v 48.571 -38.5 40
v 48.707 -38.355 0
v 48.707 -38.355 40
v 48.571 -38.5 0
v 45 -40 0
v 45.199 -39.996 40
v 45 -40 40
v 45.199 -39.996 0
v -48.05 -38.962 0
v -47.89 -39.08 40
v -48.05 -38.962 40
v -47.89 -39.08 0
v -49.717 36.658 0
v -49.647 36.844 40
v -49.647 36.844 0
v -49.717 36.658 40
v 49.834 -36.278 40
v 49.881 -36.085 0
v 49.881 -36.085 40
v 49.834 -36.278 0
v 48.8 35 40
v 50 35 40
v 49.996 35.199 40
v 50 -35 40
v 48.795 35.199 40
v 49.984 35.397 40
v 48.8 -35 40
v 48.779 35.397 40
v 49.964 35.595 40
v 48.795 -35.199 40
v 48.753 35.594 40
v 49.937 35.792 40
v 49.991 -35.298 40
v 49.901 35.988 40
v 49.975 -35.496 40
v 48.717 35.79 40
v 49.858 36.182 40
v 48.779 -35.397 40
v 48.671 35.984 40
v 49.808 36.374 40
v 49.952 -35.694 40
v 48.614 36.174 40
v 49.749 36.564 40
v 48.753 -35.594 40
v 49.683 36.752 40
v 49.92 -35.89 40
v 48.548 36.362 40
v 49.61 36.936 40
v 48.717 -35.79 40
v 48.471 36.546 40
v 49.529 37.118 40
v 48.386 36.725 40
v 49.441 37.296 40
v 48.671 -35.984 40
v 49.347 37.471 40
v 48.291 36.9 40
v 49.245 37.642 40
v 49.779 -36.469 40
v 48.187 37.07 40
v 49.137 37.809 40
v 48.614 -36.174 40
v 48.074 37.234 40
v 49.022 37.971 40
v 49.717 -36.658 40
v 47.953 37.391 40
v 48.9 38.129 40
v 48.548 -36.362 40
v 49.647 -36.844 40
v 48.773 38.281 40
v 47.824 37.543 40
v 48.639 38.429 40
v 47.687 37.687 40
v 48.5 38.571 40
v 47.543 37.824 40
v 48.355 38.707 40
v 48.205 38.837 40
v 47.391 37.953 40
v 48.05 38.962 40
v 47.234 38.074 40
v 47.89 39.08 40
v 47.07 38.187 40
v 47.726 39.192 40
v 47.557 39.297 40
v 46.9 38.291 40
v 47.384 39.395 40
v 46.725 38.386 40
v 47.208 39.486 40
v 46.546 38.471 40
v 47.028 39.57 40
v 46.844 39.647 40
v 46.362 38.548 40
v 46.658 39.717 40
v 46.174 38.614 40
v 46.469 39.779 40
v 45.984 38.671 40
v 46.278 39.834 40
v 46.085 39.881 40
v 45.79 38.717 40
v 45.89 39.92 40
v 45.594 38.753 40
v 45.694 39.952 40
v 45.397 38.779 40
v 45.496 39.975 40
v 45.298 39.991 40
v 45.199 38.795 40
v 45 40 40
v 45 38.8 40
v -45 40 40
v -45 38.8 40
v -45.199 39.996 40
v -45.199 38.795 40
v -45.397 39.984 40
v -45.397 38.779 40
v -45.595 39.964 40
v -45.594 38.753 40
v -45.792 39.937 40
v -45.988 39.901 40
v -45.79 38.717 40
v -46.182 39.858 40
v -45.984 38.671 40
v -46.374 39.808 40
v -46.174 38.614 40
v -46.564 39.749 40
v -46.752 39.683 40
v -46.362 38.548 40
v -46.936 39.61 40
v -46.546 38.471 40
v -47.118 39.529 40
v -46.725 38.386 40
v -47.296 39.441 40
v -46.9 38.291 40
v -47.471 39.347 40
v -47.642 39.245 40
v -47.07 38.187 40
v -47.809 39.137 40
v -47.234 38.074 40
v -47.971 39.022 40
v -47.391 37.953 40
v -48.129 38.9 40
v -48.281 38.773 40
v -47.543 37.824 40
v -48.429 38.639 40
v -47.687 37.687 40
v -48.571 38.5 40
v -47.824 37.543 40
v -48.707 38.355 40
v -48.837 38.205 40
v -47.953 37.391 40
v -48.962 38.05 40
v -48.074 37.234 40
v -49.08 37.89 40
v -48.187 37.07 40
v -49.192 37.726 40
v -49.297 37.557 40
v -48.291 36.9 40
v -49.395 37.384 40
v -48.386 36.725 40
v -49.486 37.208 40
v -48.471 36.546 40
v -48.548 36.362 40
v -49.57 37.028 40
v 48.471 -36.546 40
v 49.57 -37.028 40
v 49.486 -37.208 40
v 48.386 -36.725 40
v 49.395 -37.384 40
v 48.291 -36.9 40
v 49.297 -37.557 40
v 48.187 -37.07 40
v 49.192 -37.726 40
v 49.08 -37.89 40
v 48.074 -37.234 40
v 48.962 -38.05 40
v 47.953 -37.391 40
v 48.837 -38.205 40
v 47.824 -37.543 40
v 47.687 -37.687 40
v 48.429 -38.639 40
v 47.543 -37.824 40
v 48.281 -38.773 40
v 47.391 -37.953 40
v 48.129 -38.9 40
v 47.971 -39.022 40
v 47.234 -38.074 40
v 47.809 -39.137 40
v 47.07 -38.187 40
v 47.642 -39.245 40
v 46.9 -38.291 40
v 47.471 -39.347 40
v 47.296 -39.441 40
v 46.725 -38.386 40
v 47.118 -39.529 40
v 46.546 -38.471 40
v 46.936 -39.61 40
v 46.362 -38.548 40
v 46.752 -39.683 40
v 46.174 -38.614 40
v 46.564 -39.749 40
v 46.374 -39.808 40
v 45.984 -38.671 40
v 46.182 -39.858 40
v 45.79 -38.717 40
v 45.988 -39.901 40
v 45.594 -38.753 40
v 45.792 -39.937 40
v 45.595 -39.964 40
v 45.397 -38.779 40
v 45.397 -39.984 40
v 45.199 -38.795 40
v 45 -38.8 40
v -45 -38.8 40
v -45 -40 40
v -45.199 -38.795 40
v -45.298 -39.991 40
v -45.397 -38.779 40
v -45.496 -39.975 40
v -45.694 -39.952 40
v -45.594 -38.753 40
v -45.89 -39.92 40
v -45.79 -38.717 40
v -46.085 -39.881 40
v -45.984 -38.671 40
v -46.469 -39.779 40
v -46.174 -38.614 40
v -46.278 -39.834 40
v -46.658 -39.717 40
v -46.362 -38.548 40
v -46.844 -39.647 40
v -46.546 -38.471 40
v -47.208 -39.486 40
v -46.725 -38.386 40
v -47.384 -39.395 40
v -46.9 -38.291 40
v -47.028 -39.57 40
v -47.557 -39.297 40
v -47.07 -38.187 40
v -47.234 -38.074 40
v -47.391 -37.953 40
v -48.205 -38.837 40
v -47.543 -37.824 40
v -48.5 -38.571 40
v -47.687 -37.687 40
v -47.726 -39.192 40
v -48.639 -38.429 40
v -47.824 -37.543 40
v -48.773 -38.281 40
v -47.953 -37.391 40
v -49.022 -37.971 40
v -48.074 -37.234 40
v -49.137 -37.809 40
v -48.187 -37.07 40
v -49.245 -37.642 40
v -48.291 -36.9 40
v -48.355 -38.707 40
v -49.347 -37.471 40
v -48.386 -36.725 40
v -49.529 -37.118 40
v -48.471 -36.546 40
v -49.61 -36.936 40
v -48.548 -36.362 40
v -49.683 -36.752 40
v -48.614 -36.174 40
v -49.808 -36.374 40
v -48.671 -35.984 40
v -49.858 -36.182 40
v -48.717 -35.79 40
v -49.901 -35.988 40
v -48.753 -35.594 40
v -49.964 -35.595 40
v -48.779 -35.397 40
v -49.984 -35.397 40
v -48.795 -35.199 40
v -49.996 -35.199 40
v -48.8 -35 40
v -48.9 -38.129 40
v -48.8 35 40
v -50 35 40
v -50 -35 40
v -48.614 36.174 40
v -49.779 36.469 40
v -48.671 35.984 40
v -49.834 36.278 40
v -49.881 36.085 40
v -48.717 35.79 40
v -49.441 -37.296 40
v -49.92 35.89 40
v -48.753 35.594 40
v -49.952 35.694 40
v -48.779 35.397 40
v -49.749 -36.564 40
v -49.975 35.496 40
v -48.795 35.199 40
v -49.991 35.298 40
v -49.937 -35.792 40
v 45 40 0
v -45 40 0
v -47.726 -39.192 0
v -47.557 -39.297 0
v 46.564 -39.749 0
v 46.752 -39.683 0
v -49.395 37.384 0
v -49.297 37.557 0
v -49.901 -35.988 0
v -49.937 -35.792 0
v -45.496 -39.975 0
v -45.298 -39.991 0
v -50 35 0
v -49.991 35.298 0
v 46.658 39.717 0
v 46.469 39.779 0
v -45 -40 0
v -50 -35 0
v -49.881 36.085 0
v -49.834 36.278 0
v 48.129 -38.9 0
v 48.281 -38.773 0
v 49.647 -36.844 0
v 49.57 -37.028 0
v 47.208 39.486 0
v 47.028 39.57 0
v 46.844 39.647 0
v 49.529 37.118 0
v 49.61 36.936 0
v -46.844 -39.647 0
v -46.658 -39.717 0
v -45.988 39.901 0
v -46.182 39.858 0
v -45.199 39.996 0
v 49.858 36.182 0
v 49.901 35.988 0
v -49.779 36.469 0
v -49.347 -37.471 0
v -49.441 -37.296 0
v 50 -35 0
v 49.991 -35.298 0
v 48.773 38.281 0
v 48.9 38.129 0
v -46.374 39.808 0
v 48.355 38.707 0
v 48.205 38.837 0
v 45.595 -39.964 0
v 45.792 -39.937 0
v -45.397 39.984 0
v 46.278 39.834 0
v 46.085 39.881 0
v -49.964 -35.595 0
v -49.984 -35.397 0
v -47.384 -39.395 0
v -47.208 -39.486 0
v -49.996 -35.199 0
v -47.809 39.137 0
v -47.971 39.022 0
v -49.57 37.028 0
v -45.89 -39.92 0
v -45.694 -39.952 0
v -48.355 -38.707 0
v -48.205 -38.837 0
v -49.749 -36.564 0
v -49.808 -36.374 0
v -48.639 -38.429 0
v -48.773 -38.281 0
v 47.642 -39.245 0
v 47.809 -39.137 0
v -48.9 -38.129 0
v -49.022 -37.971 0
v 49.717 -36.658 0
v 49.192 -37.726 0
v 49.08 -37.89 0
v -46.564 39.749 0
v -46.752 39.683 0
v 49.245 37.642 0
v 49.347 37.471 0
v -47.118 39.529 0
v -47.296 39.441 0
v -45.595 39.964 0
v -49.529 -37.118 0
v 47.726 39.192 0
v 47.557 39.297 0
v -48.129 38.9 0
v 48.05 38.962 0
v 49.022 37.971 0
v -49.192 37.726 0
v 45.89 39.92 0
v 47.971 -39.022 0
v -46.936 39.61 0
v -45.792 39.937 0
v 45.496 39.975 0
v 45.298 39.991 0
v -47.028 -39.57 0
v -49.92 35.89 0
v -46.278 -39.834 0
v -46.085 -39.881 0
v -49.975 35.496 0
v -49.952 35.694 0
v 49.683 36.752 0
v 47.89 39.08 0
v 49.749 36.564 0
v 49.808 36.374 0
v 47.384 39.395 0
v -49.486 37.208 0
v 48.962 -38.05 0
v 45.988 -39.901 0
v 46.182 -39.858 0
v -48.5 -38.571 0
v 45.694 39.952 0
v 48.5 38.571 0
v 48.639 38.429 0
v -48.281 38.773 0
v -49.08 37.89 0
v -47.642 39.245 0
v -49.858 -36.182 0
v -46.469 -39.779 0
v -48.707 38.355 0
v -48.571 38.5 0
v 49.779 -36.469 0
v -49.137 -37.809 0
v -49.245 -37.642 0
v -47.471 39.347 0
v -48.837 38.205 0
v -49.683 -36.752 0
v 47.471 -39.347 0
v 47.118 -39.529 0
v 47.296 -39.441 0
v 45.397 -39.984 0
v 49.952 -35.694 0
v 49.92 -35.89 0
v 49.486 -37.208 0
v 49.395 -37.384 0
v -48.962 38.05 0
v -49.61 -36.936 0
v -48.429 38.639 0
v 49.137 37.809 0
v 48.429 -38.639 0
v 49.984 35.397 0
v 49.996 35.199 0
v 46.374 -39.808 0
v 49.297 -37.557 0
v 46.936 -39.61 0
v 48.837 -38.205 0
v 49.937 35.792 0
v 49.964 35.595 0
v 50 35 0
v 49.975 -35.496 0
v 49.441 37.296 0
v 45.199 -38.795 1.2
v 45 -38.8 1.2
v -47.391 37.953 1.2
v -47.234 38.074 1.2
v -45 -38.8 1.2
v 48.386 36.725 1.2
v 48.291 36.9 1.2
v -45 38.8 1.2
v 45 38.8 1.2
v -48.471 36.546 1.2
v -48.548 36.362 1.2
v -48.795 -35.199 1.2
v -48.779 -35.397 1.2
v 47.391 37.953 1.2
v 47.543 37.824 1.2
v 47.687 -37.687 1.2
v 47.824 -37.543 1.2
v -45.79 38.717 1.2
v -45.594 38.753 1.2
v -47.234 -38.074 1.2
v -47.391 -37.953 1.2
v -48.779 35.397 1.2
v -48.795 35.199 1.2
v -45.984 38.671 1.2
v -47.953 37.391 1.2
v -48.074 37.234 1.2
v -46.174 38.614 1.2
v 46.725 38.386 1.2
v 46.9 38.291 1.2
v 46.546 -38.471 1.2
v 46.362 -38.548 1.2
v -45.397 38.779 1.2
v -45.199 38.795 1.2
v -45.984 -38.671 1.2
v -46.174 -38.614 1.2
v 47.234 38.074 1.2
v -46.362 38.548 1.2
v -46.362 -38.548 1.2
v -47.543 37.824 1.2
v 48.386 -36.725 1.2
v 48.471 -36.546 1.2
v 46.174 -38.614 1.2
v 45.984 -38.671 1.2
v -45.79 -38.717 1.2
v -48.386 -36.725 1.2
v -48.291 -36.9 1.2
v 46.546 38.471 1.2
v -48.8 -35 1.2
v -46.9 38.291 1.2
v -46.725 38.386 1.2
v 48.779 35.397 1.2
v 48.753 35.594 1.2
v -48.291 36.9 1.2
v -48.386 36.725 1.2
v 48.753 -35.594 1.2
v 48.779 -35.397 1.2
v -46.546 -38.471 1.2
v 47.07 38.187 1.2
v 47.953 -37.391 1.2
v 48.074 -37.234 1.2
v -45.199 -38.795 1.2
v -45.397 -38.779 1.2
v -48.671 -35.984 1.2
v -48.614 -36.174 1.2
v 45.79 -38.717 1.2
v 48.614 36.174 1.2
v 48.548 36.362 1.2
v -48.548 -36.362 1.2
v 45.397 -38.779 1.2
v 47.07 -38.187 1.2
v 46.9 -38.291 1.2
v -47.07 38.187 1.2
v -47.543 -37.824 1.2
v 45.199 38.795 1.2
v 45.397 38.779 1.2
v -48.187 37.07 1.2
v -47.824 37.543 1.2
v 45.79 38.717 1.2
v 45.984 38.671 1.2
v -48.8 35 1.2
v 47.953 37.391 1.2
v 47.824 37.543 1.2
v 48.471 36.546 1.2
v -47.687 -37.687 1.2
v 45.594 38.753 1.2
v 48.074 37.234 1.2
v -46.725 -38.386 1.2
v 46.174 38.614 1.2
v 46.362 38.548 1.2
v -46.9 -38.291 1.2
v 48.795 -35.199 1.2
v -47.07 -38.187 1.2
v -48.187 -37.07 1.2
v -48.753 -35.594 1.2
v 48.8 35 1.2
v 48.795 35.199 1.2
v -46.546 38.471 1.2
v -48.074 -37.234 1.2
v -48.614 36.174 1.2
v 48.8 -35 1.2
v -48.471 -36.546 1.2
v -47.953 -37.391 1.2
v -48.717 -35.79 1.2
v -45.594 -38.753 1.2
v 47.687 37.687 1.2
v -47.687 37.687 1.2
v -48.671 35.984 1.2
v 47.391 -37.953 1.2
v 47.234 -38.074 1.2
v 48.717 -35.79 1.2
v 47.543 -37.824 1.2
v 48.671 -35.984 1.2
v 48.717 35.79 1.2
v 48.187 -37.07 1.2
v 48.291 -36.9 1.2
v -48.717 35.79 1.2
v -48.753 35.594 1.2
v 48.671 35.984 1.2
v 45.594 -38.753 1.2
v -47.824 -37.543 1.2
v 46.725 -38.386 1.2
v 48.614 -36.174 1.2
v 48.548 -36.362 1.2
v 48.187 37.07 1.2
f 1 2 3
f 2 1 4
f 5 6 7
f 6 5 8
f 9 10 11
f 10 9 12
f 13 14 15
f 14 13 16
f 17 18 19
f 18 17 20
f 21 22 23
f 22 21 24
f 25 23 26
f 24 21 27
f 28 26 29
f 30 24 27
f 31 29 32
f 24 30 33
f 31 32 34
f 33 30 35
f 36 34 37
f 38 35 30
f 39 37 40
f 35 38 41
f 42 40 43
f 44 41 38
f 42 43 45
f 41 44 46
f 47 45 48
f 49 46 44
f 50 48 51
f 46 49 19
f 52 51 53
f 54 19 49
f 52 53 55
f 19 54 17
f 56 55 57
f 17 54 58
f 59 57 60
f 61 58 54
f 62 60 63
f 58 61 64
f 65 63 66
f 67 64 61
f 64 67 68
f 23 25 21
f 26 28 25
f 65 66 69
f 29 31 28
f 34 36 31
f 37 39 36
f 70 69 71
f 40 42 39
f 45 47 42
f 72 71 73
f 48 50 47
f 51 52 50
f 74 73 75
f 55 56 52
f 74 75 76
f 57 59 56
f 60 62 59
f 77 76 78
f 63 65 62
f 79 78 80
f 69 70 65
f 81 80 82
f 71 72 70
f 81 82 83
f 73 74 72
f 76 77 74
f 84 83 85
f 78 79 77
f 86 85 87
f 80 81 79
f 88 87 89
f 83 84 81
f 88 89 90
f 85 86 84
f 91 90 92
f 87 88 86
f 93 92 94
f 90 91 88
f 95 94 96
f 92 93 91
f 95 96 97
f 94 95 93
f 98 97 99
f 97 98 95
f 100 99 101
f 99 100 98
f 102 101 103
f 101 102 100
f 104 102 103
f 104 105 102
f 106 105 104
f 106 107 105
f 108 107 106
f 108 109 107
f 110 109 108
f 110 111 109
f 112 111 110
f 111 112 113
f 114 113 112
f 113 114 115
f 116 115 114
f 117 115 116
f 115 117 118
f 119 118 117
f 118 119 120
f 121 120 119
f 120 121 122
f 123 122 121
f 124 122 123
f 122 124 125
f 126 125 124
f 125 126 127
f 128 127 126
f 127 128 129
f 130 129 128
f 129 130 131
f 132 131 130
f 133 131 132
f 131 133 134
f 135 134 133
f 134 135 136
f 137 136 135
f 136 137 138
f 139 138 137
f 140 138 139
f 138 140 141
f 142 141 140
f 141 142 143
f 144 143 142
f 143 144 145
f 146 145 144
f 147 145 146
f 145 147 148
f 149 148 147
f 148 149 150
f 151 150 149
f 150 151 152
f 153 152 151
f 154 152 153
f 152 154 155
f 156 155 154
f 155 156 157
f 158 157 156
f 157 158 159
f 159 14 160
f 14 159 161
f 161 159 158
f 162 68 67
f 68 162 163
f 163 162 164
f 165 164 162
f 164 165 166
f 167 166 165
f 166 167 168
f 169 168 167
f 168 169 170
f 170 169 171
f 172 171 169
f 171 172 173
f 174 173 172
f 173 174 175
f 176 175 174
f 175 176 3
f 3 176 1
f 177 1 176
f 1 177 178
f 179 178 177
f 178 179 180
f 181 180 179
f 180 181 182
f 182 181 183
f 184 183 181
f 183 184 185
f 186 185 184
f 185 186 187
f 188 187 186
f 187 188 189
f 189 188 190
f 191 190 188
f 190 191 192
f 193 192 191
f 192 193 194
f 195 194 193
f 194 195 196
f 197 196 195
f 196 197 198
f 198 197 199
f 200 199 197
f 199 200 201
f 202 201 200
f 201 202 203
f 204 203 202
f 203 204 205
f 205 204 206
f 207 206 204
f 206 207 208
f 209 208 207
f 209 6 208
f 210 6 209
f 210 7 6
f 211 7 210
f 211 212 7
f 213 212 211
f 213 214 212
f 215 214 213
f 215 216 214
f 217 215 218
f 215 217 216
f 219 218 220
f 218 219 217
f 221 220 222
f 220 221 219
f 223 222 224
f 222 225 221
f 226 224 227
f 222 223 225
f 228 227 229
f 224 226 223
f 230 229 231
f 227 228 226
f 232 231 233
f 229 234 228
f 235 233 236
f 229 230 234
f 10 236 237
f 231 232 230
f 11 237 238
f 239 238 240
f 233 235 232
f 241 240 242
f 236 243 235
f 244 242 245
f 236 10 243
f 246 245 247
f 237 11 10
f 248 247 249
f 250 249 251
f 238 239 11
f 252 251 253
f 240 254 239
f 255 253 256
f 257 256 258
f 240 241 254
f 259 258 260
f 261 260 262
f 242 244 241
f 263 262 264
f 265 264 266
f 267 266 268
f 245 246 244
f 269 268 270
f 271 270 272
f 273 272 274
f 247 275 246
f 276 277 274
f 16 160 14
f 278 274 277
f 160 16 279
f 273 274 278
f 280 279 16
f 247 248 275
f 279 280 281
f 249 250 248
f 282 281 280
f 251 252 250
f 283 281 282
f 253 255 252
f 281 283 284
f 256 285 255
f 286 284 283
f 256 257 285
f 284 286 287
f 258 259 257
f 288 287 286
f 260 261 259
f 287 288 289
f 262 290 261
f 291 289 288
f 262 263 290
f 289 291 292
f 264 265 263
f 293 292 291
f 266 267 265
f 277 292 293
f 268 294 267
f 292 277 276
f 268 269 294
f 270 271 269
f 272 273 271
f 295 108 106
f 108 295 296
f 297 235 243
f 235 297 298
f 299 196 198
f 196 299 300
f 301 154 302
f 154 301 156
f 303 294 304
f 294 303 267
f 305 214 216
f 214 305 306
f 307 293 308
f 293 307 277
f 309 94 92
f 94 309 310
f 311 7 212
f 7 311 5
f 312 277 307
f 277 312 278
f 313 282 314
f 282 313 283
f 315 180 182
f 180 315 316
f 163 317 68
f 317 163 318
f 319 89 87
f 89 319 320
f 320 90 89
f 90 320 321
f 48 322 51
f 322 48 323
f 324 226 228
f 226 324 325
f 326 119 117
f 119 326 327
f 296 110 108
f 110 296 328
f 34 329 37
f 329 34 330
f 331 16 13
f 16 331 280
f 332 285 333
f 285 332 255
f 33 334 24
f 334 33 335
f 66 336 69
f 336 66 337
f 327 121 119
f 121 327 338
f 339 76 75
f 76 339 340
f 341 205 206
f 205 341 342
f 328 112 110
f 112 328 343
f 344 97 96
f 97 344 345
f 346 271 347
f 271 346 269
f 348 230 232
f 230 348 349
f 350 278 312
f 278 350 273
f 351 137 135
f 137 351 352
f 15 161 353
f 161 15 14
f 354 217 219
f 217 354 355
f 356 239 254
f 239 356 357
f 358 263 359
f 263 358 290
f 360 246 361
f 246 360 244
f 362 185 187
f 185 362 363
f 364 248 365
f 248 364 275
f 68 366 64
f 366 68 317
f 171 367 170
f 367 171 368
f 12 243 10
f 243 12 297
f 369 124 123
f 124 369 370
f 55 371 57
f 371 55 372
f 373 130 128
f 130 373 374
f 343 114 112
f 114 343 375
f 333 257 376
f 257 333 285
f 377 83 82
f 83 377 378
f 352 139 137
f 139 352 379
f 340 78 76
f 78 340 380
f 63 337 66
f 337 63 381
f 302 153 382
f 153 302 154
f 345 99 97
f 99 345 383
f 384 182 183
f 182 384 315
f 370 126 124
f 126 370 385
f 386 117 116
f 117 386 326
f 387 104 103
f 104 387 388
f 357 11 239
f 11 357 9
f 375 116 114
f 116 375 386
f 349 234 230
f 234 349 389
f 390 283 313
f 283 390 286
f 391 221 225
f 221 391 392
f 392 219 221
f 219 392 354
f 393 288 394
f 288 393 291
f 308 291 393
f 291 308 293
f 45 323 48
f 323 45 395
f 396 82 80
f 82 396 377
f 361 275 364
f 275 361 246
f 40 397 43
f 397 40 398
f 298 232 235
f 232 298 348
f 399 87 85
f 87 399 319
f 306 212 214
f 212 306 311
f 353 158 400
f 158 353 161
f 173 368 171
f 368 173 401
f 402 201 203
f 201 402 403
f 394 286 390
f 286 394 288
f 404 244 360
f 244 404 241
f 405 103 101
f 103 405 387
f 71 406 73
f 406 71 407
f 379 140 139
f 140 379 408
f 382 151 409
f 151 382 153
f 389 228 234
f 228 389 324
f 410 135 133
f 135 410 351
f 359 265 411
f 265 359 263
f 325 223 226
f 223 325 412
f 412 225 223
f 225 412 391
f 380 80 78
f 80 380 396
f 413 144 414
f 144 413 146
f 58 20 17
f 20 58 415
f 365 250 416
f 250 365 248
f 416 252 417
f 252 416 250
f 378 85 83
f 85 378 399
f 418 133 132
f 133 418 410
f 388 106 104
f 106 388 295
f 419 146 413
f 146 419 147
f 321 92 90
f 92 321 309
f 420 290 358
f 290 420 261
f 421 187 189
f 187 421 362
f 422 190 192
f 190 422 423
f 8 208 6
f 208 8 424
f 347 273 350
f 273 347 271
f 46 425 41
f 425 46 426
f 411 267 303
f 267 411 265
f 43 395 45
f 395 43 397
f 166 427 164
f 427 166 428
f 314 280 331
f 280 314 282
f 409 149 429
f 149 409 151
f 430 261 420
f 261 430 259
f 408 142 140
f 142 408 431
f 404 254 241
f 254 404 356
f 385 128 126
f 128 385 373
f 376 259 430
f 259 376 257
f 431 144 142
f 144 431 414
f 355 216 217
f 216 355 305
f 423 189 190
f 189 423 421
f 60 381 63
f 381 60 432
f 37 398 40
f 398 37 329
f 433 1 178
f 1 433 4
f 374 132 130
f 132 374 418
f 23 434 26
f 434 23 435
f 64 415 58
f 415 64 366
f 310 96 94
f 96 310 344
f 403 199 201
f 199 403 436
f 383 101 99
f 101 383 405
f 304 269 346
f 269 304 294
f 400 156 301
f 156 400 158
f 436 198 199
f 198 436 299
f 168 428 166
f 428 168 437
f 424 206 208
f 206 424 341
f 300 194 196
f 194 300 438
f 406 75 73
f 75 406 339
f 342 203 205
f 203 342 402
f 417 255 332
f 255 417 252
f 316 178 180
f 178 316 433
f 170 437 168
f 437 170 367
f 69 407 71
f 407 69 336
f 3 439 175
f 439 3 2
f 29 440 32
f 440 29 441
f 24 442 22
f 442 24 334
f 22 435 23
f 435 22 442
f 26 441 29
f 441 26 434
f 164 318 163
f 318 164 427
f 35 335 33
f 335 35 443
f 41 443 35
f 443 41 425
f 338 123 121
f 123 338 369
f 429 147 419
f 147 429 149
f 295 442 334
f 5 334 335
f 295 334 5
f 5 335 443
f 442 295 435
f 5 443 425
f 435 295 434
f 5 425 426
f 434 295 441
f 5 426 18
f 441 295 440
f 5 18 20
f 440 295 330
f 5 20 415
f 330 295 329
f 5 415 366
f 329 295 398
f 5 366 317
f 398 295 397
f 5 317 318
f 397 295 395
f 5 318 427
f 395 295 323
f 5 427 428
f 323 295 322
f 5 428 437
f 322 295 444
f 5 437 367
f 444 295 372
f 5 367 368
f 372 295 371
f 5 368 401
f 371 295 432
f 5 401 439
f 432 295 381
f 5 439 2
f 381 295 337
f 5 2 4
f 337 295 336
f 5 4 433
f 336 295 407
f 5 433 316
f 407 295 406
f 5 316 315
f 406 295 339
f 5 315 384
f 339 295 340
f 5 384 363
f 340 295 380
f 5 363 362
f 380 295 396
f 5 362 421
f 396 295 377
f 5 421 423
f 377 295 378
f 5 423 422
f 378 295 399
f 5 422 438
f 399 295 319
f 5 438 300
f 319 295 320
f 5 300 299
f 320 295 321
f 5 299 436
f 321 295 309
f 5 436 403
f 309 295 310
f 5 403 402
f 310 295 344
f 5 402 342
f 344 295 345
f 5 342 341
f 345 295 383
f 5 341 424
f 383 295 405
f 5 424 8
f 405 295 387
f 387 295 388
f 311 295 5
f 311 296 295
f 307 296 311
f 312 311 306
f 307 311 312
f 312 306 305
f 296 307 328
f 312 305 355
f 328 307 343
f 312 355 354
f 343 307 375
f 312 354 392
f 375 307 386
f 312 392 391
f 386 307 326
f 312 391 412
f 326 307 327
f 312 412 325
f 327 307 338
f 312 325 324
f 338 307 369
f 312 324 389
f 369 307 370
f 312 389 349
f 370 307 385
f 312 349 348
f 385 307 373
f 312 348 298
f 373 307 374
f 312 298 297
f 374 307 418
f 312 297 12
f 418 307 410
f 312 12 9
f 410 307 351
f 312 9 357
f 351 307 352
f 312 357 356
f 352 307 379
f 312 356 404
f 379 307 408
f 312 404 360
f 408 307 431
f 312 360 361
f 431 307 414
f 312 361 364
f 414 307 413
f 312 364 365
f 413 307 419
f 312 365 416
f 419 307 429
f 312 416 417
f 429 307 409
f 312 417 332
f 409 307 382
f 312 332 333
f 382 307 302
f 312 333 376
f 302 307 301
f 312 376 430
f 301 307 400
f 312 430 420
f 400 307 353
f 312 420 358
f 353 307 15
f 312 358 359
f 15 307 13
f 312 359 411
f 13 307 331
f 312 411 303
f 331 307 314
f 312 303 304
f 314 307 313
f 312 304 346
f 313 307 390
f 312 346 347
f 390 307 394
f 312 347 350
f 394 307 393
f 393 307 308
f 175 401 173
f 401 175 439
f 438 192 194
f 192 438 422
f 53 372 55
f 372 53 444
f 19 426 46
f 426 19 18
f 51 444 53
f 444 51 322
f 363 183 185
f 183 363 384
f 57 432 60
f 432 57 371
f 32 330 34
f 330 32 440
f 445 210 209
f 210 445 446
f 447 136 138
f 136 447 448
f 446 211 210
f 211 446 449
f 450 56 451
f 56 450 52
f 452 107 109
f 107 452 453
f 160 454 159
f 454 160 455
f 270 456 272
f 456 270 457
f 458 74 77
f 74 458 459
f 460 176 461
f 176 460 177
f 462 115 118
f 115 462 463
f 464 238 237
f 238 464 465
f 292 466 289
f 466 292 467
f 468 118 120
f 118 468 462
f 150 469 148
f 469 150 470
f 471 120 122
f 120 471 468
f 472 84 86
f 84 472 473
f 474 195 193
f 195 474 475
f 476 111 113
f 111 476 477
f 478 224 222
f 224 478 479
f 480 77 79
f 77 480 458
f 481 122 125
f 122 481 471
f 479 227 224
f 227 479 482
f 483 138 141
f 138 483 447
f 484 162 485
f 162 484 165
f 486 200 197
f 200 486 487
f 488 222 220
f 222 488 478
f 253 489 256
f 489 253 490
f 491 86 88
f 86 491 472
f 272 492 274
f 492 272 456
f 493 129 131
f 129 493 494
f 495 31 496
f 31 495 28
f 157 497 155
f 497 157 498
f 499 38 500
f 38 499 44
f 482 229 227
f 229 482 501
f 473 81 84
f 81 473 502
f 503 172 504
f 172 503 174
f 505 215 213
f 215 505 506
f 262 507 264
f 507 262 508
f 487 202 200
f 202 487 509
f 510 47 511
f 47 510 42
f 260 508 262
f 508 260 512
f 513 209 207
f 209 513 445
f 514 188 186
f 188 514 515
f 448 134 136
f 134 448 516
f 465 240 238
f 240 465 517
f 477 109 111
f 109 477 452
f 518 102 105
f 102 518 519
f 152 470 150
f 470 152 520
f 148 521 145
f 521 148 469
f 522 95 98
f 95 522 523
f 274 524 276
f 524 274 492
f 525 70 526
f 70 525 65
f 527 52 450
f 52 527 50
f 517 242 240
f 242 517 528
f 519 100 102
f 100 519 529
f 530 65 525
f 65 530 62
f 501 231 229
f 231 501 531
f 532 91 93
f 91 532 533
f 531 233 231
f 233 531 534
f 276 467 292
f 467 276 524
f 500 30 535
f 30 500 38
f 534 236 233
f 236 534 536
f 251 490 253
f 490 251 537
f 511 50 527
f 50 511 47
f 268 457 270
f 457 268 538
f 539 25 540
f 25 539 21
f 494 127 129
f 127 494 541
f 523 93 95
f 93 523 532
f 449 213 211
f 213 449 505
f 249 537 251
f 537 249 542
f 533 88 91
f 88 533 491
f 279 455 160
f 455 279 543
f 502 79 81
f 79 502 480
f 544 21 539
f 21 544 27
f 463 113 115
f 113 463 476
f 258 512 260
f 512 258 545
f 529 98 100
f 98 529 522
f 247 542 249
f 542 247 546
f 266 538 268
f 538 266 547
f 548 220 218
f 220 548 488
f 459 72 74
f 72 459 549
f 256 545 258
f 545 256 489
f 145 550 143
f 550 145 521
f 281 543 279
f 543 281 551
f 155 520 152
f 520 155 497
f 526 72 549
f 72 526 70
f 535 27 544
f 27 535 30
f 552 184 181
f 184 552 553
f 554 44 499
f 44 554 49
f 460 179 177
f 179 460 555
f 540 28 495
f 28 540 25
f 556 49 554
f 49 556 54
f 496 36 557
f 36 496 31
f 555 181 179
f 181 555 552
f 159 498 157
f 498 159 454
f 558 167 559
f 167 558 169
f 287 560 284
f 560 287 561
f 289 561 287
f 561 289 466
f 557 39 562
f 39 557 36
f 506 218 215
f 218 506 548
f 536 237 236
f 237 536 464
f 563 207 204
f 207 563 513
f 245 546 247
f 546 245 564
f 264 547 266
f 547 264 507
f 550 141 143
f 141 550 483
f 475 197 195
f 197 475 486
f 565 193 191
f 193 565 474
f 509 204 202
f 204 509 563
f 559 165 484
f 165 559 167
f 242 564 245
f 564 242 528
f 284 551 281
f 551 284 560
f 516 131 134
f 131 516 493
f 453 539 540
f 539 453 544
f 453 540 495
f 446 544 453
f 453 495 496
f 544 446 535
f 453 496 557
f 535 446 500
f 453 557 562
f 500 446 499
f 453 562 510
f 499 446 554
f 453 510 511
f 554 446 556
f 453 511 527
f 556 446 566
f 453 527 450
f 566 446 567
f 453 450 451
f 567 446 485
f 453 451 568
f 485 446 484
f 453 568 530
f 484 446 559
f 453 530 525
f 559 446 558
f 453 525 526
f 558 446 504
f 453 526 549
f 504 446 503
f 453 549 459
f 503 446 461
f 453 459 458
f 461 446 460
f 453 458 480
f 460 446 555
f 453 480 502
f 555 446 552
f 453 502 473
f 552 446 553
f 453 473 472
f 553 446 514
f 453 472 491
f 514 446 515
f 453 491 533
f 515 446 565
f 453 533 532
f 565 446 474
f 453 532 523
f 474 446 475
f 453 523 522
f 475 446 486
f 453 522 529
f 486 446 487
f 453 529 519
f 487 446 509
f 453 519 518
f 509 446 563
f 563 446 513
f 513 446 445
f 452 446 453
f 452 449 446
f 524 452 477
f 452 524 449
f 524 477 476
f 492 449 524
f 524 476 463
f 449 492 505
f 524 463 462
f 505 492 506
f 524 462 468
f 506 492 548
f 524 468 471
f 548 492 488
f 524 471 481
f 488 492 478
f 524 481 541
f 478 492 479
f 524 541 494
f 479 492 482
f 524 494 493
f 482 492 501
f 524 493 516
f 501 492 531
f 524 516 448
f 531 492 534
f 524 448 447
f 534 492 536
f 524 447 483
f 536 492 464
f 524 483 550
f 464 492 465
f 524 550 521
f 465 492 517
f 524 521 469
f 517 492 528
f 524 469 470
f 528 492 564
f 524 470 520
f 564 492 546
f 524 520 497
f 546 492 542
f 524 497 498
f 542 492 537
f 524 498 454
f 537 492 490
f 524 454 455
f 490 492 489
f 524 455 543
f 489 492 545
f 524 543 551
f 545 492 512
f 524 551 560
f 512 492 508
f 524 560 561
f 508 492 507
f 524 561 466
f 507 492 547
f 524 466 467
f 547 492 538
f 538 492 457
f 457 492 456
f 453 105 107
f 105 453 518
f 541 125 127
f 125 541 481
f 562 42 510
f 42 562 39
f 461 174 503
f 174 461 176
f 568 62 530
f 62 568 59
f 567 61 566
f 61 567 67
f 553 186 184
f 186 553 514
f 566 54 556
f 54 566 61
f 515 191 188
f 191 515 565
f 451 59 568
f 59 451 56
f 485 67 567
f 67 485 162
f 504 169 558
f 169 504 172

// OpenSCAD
// 002-open-box.scad  无盖盒子（四根竖直棱圆角）
// 外尺寸：长 L x 宽 W x 高 H（mm），壁厚 t，顶面开口，竖直棱圆角半径 r
// 可调参数：openscad -D L=120 -D W=100 -D H=50 -D t=1.5 -D r=5 ...

L = 100;  // 长（X 方向，外径）
W = 80;   // 宽（Y 方向，外径）
H = 40;   // 高（Z 方向，整体外径）
t = 1.2;  // 壁厚
r = 5;    // 竖直棱圆角半径（需 r < min(L,W)/2；r > t 时内角也为圆角，r < t 时内角为直角）

// 圆弧细分：$fa 越小圆角越光滑（单位：度，0 = 最平滑但面片更多）
$fa = 1;
$fs = 0.2;

// 2D 圆角矩形（以中心为原点，宽 w x h，圆角 rad）
// 技巧：缩小的方块做 offset(rad) 外扩 → 角部自动变圆
module rrect(w, h, rad) {
  offset(rad) square([w - 2*rad, h - 2*rad], center = true);
}

difference() {
  // 外形：圆角矩形截面 + 竖直拉伸
  linear_extrude(height = H)
    rrect(L, W, r);

  // 内空腔：缩进 t 的圆角矩形，从 z=t 起向上穿透顶面 → 无盖
  translate([0, 0, t])
    linear_extrude(height = H)
      rrect(L - 2*t, W - 2*t, r - t);
}
